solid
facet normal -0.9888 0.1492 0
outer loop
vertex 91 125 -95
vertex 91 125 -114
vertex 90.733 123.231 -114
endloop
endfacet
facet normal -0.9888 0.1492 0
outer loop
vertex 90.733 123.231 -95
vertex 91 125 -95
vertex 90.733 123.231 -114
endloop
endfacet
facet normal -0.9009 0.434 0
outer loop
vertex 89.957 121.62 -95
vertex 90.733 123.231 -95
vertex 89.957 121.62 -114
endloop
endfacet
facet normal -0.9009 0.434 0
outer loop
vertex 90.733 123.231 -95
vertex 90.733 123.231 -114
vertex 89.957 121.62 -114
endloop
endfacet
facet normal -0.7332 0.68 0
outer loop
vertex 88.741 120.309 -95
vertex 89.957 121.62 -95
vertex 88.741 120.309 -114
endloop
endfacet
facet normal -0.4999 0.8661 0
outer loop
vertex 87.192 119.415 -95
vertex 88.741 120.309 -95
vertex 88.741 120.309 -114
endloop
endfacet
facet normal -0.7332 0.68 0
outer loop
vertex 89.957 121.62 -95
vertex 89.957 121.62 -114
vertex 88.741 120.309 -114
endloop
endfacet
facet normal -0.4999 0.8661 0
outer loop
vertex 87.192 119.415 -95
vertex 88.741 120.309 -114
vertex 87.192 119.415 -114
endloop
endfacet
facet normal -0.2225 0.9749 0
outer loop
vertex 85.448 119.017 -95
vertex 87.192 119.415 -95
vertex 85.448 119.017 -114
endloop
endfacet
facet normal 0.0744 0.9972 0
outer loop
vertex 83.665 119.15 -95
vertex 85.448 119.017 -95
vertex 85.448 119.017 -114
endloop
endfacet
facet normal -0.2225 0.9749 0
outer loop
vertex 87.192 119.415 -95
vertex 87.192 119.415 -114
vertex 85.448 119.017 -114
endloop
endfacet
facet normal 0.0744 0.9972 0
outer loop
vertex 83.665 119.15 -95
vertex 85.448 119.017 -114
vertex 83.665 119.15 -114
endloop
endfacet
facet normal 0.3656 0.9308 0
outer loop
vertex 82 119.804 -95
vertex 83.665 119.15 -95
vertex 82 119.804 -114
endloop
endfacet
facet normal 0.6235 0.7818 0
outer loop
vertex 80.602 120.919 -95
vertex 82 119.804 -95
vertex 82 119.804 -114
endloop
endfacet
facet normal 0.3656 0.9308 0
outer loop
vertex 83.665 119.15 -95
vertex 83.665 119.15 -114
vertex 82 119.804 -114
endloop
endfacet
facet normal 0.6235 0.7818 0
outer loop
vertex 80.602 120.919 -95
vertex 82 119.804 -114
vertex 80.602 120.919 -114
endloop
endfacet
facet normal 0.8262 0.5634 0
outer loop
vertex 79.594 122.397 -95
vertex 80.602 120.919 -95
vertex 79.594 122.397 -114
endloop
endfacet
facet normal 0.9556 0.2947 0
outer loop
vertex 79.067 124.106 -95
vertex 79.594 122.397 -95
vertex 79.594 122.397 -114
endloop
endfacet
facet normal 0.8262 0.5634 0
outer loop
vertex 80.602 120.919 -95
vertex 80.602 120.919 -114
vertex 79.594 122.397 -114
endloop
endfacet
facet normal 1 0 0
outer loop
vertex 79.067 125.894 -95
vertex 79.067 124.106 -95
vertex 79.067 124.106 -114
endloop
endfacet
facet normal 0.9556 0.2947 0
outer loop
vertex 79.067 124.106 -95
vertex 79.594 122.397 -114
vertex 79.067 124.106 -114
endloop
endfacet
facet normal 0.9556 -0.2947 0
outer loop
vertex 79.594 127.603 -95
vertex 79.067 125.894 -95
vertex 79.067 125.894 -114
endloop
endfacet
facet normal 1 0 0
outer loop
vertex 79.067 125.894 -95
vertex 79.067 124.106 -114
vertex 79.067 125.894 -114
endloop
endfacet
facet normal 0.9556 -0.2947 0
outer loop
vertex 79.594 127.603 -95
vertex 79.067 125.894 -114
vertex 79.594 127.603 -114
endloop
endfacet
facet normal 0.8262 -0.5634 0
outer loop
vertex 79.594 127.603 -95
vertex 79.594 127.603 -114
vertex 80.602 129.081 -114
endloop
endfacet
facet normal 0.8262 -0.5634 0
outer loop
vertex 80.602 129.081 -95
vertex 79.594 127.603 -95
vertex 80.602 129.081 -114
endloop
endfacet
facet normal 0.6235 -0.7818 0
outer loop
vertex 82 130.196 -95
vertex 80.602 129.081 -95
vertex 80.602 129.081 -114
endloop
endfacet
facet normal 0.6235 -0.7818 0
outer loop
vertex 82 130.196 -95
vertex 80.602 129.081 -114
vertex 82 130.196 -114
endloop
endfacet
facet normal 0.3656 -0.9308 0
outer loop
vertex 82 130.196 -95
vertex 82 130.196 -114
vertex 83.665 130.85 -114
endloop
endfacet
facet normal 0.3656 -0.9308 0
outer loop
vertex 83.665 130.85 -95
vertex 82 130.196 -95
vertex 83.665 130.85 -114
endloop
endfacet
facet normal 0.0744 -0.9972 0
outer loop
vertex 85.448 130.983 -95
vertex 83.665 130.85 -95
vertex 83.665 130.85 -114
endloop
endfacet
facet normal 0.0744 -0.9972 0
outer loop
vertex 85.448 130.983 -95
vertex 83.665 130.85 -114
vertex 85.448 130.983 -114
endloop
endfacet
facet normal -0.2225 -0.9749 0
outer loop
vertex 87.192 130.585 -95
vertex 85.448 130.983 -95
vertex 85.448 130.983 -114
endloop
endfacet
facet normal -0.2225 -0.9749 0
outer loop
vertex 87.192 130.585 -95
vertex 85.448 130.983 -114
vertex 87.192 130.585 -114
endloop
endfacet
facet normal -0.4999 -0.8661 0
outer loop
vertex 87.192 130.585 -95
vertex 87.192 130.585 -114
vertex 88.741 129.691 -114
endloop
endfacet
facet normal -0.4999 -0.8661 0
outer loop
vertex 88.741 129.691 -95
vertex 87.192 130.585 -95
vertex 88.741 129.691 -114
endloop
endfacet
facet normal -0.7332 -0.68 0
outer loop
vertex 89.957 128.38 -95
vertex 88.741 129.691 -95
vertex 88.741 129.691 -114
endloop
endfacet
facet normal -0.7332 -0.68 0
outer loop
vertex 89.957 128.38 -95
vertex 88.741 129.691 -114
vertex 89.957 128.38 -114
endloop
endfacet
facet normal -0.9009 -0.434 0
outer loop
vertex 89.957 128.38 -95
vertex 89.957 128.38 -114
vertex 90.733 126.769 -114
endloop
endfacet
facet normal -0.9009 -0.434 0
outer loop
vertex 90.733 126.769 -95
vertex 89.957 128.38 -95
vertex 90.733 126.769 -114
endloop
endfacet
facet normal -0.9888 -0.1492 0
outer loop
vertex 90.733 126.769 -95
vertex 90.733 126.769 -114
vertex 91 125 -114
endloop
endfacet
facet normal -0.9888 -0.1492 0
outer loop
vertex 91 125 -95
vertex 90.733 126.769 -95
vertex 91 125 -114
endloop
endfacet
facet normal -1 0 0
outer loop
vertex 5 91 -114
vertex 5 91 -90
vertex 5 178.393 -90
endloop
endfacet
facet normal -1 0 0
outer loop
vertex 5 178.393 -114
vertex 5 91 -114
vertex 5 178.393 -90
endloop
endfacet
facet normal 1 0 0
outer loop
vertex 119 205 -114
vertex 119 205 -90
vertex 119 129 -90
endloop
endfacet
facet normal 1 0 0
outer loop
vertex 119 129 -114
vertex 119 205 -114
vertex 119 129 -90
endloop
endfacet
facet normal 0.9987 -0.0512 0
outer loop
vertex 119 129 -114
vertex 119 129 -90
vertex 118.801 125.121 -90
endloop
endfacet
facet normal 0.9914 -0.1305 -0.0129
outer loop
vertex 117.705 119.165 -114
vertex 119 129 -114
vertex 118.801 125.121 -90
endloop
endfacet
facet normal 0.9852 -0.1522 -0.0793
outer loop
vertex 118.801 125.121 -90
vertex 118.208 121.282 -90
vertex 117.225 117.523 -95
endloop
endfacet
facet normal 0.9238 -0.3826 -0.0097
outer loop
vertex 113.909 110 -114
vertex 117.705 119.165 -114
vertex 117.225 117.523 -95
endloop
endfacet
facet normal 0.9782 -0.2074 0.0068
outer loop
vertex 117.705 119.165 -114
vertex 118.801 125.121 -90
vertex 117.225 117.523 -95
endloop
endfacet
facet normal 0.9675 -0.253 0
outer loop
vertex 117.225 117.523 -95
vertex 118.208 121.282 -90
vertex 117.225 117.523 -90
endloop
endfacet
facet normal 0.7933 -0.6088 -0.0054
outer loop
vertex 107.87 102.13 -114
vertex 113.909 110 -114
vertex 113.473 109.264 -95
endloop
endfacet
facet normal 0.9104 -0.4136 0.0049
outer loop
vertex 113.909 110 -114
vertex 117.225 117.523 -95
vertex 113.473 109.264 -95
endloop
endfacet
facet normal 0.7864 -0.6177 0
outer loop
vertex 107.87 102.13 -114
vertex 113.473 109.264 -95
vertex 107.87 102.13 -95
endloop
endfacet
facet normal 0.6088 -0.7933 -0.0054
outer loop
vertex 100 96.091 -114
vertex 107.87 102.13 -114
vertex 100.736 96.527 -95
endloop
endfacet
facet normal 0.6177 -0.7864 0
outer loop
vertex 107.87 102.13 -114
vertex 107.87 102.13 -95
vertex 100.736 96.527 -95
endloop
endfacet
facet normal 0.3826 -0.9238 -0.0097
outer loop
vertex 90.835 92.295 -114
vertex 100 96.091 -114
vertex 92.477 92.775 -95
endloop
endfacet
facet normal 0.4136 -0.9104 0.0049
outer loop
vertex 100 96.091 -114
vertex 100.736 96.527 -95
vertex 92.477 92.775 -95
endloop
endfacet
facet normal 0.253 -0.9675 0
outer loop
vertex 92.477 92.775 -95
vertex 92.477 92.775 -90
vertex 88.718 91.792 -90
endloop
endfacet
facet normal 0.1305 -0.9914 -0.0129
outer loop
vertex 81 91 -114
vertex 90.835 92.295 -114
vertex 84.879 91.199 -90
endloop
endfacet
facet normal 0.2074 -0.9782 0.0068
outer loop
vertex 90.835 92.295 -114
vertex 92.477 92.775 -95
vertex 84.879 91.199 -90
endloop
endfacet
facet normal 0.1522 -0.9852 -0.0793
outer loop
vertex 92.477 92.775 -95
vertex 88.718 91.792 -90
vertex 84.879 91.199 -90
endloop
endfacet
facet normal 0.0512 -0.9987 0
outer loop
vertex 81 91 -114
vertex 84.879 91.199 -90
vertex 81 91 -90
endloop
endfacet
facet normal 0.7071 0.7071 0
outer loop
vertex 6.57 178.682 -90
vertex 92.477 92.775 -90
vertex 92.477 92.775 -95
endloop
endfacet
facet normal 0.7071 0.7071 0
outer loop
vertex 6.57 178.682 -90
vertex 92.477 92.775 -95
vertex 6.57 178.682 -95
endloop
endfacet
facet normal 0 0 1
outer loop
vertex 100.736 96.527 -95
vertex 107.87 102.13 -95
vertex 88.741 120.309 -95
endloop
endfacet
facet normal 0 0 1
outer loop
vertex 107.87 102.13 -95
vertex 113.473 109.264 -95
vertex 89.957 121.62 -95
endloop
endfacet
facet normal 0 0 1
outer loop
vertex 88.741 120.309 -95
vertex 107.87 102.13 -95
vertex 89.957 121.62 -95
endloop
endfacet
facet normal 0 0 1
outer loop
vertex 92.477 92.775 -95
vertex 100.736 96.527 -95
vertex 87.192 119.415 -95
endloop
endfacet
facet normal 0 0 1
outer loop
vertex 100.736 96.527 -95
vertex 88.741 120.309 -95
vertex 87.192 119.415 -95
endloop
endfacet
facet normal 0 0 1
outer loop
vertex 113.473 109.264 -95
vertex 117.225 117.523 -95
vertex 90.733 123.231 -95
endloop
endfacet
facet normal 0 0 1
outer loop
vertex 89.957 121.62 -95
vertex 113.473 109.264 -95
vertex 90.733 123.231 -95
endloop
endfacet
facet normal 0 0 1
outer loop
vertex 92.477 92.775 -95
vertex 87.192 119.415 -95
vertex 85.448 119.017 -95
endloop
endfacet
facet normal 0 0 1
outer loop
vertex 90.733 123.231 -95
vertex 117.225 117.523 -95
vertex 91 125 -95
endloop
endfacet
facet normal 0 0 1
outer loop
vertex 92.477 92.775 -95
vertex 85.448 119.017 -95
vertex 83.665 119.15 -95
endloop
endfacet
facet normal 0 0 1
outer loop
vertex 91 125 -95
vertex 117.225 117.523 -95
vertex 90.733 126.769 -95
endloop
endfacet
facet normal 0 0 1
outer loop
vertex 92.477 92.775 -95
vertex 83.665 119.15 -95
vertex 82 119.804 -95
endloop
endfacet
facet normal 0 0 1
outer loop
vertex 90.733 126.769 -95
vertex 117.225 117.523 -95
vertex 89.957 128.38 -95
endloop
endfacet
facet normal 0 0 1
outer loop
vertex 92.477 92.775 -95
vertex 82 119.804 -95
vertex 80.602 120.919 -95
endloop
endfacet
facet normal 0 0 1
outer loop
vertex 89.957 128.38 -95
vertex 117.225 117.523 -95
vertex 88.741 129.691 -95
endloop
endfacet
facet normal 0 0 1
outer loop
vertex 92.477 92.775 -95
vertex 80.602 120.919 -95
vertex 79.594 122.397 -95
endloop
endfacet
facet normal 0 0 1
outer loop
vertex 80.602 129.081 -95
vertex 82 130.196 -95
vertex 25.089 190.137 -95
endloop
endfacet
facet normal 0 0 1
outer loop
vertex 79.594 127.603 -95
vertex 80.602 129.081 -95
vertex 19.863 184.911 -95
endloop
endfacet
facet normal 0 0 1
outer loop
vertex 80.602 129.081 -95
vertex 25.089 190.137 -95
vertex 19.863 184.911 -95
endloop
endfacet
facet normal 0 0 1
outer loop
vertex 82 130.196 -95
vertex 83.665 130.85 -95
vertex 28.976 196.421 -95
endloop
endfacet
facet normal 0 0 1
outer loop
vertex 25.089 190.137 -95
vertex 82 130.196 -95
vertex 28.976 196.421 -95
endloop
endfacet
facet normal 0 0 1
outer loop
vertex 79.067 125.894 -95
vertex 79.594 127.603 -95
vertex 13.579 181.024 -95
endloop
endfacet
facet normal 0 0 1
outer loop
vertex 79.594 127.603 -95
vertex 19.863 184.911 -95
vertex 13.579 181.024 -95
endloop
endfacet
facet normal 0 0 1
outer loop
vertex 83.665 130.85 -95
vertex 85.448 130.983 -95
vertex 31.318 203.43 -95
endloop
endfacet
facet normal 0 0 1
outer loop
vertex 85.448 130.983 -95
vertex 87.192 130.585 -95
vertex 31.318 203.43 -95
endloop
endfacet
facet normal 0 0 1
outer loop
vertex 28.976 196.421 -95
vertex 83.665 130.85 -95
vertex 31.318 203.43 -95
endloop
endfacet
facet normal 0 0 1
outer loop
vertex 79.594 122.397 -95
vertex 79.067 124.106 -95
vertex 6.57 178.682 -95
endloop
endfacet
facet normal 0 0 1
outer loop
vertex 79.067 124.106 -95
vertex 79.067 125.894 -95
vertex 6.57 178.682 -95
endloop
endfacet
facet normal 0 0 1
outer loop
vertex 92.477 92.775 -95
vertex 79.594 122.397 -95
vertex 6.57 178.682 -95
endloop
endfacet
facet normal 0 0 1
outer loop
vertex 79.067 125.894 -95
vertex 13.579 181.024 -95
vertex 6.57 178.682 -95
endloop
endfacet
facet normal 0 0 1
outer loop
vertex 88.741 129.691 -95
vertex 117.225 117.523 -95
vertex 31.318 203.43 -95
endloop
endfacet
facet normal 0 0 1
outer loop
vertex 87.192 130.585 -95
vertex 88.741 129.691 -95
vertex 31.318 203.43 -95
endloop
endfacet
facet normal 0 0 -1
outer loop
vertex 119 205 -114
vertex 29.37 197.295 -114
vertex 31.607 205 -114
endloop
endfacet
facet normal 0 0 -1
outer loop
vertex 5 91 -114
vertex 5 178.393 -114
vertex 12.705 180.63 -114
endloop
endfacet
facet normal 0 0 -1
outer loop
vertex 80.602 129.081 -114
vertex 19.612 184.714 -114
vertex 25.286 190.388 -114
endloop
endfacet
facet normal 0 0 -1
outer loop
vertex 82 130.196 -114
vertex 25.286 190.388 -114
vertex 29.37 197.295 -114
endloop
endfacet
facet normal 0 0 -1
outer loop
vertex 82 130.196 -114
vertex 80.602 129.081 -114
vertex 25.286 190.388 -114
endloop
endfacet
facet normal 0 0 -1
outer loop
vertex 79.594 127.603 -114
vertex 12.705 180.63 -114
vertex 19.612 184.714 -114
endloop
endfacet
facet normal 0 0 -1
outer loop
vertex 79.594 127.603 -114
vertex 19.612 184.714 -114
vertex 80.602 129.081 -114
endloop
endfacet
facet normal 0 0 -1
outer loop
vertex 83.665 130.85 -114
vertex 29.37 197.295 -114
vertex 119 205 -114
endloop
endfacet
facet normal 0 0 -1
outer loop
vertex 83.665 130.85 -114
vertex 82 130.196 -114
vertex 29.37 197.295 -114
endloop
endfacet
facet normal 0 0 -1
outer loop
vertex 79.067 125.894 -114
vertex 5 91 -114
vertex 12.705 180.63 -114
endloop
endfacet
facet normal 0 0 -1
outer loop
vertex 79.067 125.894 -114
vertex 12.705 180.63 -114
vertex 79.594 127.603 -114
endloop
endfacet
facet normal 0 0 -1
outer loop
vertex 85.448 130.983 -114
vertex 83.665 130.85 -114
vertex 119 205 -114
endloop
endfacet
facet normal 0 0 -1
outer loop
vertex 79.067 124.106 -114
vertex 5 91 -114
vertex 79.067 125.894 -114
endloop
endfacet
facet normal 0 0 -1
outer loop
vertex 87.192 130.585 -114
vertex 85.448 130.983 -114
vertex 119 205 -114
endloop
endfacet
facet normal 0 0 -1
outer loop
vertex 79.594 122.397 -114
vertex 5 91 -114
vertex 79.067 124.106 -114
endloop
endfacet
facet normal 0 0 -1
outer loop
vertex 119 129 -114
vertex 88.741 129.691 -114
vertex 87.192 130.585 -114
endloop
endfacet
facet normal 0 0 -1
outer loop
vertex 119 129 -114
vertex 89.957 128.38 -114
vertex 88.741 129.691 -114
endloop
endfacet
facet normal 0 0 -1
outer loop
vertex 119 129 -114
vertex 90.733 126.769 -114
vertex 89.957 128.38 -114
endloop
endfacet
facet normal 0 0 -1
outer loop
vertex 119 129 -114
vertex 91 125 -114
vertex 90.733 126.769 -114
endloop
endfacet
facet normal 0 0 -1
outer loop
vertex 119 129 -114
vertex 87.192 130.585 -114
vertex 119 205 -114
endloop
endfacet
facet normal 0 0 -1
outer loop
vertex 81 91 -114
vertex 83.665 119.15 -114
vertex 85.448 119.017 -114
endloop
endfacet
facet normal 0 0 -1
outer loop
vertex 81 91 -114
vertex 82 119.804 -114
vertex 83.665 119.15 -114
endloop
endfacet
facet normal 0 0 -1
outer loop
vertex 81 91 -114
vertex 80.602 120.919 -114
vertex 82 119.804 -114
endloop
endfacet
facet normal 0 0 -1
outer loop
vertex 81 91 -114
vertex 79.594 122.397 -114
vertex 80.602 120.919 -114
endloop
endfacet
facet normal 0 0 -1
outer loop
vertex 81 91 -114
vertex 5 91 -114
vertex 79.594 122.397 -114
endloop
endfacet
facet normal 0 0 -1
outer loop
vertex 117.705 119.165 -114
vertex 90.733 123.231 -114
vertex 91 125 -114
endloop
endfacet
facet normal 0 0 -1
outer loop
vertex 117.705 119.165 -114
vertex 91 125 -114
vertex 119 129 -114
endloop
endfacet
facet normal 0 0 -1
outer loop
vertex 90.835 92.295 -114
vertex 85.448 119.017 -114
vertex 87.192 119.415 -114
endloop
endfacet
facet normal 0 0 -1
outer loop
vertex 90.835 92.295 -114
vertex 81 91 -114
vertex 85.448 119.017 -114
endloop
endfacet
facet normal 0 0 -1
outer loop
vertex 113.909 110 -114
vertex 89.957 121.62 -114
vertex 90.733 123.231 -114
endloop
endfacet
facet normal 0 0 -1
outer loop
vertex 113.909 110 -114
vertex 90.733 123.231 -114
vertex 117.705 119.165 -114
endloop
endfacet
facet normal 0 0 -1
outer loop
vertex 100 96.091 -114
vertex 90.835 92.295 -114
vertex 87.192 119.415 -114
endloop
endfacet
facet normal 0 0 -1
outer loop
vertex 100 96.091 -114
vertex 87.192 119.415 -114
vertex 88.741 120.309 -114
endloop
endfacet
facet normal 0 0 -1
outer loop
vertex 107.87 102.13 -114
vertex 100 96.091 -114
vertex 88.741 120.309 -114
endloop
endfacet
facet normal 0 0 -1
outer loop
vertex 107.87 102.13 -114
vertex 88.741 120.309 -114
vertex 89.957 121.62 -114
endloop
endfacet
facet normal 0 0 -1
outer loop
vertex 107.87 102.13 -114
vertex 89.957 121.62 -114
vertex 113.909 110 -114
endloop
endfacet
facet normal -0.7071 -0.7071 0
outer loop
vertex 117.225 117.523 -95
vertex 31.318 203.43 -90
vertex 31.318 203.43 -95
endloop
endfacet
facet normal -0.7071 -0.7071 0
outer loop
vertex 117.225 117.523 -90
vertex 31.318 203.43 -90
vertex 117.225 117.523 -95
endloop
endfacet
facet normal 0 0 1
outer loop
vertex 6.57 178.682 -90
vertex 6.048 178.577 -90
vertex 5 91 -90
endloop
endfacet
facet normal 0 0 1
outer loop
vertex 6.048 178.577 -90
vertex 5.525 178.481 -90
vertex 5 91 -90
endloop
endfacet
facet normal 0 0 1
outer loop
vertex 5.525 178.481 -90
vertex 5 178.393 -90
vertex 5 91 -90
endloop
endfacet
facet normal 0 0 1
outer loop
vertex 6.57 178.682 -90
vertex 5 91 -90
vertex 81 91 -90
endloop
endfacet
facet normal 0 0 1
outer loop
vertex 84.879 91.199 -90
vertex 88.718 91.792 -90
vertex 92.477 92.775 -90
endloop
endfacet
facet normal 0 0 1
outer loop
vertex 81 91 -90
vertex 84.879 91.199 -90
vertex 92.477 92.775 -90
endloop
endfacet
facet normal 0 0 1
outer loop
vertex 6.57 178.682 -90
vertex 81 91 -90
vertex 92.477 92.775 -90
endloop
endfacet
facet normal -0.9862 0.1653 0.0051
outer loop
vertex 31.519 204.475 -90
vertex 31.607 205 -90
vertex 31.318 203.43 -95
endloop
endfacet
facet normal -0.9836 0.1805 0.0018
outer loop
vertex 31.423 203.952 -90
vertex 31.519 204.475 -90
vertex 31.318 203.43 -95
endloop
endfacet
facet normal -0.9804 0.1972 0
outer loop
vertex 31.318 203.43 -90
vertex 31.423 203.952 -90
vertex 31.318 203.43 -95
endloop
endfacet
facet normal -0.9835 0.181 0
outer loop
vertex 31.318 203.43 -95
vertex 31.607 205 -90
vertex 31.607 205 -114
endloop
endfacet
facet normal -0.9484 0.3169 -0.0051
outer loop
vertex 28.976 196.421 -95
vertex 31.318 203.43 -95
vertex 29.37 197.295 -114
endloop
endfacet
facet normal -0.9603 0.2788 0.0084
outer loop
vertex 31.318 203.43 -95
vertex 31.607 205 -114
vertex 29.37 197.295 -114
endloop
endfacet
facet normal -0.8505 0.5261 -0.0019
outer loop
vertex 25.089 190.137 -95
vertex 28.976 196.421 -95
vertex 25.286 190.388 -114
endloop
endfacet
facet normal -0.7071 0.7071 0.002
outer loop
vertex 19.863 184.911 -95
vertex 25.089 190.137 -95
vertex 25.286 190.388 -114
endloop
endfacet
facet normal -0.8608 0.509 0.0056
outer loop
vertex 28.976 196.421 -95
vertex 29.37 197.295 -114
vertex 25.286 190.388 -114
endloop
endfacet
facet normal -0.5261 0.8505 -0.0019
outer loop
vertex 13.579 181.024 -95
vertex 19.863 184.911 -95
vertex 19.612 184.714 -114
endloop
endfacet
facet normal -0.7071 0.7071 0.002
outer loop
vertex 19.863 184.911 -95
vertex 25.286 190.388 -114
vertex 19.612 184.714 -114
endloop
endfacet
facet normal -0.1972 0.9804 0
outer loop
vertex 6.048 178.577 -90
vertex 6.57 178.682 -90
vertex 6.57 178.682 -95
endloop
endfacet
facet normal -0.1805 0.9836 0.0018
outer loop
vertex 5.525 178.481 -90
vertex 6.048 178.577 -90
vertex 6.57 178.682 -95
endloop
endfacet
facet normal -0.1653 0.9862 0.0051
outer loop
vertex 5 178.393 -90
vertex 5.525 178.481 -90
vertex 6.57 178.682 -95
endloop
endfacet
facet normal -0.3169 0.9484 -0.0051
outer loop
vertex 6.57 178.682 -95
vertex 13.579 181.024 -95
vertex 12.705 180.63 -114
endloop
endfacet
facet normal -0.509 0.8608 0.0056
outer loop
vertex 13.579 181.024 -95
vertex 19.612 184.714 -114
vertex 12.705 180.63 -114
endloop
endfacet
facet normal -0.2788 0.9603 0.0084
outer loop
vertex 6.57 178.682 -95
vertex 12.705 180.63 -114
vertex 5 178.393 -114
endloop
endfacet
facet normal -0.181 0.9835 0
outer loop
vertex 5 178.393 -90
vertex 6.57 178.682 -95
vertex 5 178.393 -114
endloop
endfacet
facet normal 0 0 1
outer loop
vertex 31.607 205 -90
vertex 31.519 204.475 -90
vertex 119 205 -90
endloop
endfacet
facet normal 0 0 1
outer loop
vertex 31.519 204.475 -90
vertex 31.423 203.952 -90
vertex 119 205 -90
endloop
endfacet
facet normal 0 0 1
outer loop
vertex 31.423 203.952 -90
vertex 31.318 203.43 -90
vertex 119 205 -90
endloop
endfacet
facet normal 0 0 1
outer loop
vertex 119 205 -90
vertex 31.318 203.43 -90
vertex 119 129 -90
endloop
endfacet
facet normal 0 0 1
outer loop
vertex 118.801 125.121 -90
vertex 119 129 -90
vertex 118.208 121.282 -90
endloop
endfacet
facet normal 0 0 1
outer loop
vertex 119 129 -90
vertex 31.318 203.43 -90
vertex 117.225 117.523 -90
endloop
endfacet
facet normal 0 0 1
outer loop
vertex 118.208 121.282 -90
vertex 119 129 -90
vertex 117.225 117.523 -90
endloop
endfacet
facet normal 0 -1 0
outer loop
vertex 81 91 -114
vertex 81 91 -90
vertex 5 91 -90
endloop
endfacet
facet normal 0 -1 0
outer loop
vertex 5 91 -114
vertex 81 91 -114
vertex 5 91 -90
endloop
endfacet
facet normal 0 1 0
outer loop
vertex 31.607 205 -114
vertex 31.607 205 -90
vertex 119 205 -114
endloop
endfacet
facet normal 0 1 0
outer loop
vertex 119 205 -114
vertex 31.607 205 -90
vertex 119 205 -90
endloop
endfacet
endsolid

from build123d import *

# Parameters (mm, degrees)
PAD016_DEPTH            = 24
POCKET028_DEPTH         = 5
SKETCH046_R             = 32
SKETCH046_R_2           = 6
POCKET029_DEPTH         = 24
BODY014_PLACEMENT_ANGLE = 180


with BuildPart() as part:
    # Sketch044 → Pad016 (new body)
    with BuildSketch(Plane.XY):
        with BuildLine():
            Line((5, 5), (119, 5))
            Line((119, 5), (119, 81))
            ThreePointArc((119, 81), (107.870058, 107.870058), (81, 119))
            Line((81, 119), (5, 119))
            Line((5, 119), (5, 5))
        make_face()
    extrude(amount=PAD016_DEPTH)

    # Sketch045 → Pocket028 (cut)
    with BuildSketch(Plane(origin=(0, 0, 0), x_dir=(1, 0, 0), z_dir=(0, 0, -1))):
        Polygon((12.374369, 12.374369), (123.206096, -98.457359), (98.457359, -123.206096), (-12.374369, -12.374369), (0, 0), align=None)
    extrude(amount=-POCKET028_DEPTH, mode=Mode.SUBTRACT)

    # Sketch046 → Pocket029 (cut)
    with BuildSketch(Plane.XY.offset(24)):
        Circle(SKETCH046_R)
        with Locations((85, 85)):
            Circle(SKETCH046_R_2)
    extrude(amount=-POCKET029_DEPTH, mode=Mode.SUBTRACT)


with BuildPart() as part_1:
    # Body014 placement: moved
    add(part.part.moved(Location((0, 210, -90))).rotate(Axis((0, 210, -90), (1, 0, 0)), BODY014_PLACEMENT_ANGLE))


solid = part_1.part
